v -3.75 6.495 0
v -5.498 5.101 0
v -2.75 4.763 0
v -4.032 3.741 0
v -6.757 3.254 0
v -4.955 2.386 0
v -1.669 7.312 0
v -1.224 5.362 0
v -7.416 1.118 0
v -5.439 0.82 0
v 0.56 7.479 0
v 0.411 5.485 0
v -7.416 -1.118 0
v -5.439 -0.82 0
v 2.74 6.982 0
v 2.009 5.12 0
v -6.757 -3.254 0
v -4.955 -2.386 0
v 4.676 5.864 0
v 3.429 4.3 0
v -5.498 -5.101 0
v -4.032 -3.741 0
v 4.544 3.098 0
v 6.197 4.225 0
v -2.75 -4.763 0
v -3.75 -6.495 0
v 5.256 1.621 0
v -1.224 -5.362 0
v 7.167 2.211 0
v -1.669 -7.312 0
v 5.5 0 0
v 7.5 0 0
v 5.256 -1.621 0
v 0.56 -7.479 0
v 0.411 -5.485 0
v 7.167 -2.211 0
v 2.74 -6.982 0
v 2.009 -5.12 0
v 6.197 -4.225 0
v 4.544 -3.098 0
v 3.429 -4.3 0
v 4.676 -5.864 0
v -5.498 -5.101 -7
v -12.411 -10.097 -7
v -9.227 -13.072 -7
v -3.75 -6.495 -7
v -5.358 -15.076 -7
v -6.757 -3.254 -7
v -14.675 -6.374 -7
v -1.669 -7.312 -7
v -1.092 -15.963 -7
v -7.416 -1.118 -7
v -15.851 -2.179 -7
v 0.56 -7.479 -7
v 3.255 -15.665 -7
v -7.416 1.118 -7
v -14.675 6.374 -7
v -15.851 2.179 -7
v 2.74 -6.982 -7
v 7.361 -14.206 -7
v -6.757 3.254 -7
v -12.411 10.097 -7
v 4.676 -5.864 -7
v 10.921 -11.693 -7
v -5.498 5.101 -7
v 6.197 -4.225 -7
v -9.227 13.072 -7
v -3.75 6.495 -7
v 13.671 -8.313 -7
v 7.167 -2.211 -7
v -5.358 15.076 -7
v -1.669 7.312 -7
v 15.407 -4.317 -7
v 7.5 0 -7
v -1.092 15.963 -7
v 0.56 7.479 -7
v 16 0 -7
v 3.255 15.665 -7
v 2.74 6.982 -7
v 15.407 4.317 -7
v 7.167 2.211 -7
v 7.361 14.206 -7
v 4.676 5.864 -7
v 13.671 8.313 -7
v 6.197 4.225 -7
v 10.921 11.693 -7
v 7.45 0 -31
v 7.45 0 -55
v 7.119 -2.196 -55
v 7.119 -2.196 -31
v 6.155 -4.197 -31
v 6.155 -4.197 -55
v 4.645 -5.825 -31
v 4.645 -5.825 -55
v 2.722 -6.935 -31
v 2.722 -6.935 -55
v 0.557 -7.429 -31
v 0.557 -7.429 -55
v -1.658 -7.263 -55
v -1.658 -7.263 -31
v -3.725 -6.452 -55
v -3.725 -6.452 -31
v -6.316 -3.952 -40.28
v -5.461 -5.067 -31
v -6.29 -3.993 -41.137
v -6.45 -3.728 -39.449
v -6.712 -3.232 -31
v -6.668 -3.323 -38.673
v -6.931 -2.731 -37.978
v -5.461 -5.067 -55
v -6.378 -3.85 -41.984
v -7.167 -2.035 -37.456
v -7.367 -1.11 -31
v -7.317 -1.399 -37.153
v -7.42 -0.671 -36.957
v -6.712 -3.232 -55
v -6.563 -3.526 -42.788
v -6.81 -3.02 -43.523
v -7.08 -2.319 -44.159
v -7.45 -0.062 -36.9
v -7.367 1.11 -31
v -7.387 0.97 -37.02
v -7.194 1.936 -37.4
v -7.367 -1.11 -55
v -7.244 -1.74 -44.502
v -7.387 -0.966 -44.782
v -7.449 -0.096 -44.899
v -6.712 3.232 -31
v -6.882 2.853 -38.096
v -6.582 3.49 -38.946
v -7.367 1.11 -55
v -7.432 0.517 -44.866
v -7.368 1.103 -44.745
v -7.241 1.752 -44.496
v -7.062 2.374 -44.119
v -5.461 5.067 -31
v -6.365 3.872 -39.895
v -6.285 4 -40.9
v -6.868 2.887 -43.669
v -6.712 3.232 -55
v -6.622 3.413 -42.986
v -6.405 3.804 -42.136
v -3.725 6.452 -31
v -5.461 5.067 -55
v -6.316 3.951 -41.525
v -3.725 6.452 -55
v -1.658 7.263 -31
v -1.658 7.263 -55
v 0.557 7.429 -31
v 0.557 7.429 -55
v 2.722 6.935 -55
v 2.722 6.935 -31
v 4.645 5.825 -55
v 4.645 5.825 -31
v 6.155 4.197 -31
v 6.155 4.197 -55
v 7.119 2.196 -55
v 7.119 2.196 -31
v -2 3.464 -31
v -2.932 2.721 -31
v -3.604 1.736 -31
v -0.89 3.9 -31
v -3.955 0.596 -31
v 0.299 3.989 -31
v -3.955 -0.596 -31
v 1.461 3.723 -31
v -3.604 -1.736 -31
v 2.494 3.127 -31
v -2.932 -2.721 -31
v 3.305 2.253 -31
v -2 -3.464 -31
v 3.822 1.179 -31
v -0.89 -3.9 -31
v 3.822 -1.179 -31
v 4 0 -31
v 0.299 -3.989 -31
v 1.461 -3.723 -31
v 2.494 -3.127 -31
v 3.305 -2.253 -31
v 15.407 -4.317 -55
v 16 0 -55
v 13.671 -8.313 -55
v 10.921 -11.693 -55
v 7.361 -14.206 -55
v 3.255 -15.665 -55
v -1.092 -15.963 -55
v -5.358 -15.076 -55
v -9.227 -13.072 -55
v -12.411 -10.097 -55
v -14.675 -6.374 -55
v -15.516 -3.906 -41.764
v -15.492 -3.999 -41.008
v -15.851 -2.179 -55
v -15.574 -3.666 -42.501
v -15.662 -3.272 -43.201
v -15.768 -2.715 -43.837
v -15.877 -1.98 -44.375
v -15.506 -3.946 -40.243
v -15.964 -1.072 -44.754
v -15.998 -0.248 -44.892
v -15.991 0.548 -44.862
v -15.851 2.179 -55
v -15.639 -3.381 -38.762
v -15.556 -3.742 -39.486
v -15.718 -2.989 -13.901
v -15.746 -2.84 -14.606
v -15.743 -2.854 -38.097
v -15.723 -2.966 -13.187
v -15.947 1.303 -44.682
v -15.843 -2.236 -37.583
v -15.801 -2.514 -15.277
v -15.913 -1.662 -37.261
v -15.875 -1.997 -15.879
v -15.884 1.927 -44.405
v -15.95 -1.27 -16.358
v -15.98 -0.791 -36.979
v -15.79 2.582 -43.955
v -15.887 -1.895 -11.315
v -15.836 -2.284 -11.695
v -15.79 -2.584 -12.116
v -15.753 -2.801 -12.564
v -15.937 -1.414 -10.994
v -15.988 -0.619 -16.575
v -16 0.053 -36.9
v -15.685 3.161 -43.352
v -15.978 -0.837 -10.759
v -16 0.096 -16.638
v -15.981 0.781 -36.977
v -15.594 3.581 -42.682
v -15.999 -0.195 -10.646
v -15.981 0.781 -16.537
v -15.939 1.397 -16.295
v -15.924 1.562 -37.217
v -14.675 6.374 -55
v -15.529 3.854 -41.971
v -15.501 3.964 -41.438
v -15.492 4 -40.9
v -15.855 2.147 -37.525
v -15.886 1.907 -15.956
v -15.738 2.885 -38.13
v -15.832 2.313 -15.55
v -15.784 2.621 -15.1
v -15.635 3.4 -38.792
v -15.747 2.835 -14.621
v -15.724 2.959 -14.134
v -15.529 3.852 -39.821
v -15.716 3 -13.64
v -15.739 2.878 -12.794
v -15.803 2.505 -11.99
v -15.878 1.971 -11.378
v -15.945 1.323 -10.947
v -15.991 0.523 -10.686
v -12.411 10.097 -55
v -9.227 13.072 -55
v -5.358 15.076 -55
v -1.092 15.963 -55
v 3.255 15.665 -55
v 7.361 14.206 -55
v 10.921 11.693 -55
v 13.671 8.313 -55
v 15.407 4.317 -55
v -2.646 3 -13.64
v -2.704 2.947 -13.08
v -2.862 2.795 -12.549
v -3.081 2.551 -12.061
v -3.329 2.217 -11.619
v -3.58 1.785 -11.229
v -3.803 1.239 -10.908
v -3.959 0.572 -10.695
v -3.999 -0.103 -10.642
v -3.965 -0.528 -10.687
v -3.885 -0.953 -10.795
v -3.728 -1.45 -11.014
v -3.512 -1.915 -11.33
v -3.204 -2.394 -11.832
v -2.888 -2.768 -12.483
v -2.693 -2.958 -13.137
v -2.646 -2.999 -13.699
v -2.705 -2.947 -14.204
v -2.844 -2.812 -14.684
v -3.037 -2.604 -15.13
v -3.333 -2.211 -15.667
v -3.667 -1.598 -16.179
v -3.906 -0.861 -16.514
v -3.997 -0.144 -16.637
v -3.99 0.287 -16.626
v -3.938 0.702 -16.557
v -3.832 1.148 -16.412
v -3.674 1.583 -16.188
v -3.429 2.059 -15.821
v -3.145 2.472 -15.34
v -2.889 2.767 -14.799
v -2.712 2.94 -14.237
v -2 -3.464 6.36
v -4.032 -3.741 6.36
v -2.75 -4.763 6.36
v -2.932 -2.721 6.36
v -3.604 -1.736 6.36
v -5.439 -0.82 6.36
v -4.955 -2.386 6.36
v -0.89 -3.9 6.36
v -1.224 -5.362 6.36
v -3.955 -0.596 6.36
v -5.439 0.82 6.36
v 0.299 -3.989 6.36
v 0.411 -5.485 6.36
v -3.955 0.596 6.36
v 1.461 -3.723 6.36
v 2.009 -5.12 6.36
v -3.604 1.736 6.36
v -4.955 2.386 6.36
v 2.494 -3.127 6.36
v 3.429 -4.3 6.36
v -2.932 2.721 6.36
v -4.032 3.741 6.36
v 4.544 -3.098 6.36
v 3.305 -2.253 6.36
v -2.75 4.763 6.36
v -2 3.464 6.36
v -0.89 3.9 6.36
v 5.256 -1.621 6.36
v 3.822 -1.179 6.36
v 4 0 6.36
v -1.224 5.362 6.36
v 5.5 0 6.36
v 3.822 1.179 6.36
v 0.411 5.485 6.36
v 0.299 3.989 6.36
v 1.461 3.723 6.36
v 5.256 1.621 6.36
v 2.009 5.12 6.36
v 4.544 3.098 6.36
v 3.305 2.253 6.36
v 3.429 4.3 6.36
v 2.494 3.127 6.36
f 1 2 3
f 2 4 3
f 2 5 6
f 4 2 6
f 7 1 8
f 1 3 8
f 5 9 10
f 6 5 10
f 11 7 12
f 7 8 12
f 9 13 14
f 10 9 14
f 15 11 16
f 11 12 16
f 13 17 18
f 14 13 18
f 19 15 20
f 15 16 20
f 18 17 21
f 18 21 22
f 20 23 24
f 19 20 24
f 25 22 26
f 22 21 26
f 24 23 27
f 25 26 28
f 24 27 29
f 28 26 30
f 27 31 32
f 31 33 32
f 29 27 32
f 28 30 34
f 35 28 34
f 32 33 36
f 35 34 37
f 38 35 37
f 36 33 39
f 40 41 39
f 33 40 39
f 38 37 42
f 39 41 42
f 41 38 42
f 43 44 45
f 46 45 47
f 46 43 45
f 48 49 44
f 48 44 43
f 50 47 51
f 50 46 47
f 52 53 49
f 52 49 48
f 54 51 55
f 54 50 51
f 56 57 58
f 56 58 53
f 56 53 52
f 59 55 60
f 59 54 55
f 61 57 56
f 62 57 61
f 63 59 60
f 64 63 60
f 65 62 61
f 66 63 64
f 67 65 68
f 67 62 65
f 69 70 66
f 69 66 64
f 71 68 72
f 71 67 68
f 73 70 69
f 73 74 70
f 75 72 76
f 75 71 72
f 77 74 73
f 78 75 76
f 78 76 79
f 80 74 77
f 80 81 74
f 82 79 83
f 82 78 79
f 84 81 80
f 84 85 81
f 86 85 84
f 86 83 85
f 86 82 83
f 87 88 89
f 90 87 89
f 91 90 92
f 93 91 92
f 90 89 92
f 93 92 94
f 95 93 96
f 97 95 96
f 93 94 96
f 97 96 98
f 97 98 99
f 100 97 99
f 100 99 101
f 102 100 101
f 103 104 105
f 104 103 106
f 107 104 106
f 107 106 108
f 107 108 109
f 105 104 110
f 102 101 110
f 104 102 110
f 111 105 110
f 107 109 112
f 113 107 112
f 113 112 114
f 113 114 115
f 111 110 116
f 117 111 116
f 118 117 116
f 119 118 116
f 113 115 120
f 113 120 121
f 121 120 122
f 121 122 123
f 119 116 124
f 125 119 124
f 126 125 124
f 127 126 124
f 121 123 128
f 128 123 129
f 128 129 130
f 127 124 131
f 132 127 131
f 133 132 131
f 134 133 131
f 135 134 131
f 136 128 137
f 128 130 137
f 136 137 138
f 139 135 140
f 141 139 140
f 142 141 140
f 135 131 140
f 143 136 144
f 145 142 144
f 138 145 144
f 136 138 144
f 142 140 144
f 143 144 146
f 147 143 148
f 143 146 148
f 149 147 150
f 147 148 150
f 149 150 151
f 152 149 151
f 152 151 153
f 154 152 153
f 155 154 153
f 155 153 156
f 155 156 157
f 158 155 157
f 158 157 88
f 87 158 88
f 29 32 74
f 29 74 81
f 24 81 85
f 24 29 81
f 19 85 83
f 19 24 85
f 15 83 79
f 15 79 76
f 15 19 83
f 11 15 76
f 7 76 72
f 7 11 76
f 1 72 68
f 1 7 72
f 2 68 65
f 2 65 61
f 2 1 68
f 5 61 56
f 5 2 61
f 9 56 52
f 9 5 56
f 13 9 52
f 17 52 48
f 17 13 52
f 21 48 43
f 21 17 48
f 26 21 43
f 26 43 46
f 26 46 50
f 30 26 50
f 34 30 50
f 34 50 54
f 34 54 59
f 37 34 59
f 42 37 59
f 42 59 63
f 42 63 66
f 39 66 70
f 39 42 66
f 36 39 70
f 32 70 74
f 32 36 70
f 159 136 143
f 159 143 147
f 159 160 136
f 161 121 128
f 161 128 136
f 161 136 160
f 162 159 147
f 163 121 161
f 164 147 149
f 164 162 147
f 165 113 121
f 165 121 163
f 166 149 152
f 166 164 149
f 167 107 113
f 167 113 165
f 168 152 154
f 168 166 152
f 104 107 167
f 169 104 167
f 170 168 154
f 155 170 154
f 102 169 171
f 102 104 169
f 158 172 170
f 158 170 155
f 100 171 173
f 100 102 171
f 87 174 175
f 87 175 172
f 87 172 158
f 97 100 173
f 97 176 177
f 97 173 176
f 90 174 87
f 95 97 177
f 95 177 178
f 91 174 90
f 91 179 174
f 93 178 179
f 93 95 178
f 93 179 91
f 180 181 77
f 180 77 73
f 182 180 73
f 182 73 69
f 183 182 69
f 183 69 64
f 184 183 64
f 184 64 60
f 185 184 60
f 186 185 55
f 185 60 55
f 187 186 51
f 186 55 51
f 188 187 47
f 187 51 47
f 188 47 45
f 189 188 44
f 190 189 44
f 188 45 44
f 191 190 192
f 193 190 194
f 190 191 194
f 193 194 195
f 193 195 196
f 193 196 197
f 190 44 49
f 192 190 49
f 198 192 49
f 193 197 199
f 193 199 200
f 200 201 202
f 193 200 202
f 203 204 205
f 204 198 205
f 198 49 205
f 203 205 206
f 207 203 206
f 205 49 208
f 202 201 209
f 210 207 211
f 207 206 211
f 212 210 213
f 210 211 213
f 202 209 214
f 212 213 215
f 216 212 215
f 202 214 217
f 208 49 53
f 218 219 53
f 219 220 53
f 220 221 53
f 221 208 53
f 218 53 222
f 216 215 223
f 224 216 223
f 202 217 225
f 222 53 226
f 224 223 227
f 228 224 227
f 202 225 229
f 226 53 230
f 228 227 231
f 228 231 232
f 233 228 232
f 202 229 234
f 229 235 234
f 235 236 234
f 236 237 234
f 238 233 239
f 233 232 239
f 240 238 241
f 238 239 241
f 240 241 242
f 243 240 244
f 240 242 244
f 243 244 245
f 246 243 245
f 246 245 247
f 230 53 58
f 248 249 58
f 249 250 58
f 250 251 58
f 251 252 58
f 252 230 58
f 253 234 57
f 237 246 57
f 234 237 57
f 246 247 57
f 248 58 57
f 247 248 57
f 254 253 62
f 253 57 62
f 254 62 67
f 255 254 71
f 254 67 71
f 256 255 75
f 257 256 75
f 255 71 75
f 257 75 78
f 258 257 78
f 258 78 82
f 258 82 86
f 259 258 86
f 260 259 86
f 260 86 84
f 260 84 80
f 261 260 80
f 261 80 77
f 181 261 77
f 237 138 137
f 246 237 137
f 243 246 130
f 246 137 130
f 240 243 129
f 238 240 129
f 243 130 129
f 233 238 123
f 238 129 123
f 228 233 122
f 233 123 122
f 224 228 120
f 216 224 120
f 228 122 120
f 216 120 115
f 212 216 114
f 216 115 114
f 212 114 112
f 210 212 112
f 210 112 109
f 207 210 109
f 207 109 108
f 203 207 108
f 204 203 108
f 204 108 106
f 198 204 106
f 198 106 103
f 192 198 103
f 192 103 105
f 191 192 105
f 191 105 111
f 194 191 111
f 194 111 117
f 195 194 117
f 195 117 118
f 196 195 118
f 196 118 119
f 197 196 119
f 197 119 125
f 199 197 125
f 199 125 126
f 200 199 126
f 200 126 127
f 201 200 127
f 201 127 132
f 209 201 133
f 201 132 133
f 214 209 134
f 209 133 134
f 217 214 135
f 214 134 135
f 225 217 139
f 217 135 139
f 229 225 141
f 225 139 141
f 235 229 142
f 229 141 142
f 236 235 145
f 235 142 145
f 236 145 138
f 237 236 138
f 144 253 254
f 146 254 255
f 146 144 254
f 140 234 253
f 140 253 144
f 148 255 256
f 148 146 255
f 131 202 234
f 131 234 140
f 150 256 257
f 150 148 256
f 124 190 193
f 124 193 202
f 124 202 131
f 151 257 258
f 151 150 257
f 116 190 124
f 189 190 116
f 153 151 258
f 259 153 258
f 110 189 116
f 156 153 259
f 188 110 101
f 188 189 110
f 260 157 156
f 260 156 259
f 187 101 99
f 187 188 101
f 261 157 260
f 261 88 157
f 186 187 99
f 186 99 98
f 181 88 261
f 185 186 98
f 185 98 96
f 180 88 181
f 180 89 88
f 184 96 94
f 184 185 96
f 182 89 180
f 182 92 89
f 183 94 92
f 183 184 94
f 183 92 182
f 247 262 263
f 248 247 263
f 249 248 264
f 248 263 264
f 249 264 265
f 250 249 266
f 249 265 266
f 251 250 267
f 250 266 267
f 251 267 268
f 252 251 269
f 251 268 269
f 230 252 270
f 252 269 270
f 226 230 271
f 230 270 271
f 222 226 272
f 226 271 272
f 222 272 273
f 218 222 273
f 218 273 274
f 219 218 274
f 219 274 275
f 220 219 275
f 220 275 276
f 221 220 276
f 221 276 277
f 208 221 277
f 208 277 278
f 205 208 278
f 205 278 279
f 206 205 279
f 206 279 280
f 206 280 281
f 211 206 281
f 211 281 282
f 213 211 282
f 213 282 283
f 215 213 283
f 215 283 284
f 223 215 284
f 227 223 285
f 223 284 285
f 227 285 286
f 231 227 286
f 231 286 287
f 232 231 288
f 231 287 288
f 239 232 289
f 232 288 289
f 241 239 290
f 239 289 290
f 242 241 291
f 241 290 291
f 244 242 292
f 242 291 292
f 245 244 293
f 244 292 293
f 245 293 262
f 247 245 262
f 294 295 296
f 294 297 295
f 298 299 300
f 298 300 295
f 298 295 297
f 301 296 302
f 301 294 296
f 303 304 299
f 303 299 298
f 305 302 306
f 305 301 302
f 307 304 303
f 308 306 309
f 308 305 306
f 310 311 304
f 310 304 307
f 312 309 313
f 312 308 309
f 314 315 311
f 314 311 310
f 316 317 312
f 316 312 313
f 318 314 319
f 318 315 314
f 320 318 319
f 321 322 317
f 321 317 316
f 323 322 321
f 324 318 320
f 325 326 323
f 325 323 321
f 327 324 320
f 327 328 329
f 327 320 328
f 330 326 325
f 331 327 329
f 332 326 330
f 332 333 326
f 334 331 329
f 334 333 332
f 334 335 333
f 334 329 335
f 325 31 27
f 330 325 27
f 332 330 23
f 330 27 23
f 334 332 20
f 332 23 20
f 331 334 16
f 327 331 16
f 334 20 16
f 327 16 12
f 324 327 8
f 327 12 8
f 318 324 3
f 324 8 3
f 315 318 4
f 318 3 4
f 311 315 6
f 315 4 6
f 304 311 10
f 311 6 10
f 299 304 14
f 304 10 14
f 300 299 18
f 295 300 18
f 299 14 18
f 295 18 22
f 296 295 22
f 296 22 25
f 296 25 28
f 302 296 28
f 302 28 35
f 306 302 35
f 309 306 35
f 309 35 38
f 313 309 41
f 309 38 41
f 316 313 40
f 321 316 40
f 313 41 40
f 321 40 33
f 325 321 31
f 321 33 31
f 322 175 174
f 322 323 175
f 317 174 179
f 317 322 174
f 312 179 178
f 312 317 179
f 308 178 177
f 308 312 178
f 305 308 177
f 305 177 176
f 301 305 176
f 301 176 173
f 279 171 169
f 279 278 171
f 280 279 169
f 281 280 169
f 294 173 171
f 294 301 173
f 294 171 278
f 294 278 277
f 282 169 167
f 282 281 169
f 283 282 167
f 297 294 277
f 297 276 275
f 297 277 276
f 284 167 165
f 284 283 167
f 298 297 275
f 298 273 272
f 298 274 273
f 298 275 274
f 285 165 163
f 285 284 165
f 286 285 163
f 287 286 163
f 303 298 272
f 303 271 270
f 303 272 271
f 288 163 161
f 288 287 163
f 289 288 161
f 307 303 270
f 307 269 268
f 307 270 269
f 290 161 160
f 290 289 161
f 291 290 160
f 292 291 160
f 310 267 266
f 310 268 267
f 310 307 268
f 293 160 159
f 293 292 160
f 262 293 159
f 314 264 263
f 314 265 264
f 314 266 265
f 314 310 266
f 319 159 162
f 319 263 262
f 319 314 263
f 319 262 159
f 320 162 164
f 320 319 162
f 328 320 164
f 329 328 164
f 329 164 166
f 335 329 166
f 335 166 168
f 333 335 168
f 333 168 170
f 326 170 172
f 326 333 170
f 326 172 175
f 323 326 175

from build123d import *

# Parameters (mm, degrees)
F0_R      = 5.5
F0_R_2    = 4
F1_DEPTH  = 6.36
F2_R      = 16
F2_R_2    = 5.5
F2_R_3    = 4
F3_DEPTH  = 55
F4_R      = 36.2915386418
F4_R_2    = 16
F4_R_3    = 7.5
F5_DEPTH  = 7
F6_R      = 3
F7_DEPTH  = 25
F8_R      = 7.45
F8_R_2    = 4
F9_DEPTH  = 24
F10_R     = 4
F11_DEPTH = 25


with BuildPart() as f1:
    # F0 (on Top) → F1 (new body)
    with BuildSketch(Plane.XY):
        Circle(F0_R)
        Circle(F0_R_2, mode=Mode.SUBTRACT)
    extrude(amount=F1_DEPTH)

    # F2 (on face) → F3 (join)
    with BuildSketch(Plane(origin=(0, 0, 0), x_dir=(1, 0, 0), z_dir=(0, 0, -1))):
        Circle(F2_R)
        Circle(F2_R_2, mode=Mode.SUBTRACT)
        Circle(F2_R_2)
        Circle(F2_R_3, mode=Mode.SUBTRACT)
    extrude(amount=F3_DEPTH)

    # F4 (on face) → F5 (cut)
    with BuildSketch(Plane.XY):
        Circle(F4_R)
        Circle(F4_R_2, mode=Mode.SUBTRACT)
        Circle(F4_R_2)
        Circle(F4_R_3, mode=Mode.SUBTRACT)
    extrude(amount=-F5_DEPTH, mode=Mode.SUBTRACT)

    # F6 (on Right) → F7 (cut)
    with BuildSketch(Plane.YZ):
        with Locations((0, -13.64)):
            Circle(F6_R)
    extrude(amount=-F7_DEPTH, mode=Mode.SUBTRACT)

    # F8 (on face) → F9 (cut)
    with BuildSketch(Plane(origin=(0, 0, -55), x_dir=(1, 0, 0), z_dir=(0, 0, -1))):
        Circle(F8_R)
        Circle(F8_R_2, mode=Mode.SUBTRACT)
    extrude(amount=-F9_DEPTH, mode=Mode.SUBTRACT)

    # F10 (on Right) → F11 (cut)
    with BuildSketch(Plane.YZ):
        with Locations((0, -40.9)):
            Circle(F10_R)
    extrude(amount=-F11_DEPTH, mode=Mode.SUBTRACT)


solid = f1.part
